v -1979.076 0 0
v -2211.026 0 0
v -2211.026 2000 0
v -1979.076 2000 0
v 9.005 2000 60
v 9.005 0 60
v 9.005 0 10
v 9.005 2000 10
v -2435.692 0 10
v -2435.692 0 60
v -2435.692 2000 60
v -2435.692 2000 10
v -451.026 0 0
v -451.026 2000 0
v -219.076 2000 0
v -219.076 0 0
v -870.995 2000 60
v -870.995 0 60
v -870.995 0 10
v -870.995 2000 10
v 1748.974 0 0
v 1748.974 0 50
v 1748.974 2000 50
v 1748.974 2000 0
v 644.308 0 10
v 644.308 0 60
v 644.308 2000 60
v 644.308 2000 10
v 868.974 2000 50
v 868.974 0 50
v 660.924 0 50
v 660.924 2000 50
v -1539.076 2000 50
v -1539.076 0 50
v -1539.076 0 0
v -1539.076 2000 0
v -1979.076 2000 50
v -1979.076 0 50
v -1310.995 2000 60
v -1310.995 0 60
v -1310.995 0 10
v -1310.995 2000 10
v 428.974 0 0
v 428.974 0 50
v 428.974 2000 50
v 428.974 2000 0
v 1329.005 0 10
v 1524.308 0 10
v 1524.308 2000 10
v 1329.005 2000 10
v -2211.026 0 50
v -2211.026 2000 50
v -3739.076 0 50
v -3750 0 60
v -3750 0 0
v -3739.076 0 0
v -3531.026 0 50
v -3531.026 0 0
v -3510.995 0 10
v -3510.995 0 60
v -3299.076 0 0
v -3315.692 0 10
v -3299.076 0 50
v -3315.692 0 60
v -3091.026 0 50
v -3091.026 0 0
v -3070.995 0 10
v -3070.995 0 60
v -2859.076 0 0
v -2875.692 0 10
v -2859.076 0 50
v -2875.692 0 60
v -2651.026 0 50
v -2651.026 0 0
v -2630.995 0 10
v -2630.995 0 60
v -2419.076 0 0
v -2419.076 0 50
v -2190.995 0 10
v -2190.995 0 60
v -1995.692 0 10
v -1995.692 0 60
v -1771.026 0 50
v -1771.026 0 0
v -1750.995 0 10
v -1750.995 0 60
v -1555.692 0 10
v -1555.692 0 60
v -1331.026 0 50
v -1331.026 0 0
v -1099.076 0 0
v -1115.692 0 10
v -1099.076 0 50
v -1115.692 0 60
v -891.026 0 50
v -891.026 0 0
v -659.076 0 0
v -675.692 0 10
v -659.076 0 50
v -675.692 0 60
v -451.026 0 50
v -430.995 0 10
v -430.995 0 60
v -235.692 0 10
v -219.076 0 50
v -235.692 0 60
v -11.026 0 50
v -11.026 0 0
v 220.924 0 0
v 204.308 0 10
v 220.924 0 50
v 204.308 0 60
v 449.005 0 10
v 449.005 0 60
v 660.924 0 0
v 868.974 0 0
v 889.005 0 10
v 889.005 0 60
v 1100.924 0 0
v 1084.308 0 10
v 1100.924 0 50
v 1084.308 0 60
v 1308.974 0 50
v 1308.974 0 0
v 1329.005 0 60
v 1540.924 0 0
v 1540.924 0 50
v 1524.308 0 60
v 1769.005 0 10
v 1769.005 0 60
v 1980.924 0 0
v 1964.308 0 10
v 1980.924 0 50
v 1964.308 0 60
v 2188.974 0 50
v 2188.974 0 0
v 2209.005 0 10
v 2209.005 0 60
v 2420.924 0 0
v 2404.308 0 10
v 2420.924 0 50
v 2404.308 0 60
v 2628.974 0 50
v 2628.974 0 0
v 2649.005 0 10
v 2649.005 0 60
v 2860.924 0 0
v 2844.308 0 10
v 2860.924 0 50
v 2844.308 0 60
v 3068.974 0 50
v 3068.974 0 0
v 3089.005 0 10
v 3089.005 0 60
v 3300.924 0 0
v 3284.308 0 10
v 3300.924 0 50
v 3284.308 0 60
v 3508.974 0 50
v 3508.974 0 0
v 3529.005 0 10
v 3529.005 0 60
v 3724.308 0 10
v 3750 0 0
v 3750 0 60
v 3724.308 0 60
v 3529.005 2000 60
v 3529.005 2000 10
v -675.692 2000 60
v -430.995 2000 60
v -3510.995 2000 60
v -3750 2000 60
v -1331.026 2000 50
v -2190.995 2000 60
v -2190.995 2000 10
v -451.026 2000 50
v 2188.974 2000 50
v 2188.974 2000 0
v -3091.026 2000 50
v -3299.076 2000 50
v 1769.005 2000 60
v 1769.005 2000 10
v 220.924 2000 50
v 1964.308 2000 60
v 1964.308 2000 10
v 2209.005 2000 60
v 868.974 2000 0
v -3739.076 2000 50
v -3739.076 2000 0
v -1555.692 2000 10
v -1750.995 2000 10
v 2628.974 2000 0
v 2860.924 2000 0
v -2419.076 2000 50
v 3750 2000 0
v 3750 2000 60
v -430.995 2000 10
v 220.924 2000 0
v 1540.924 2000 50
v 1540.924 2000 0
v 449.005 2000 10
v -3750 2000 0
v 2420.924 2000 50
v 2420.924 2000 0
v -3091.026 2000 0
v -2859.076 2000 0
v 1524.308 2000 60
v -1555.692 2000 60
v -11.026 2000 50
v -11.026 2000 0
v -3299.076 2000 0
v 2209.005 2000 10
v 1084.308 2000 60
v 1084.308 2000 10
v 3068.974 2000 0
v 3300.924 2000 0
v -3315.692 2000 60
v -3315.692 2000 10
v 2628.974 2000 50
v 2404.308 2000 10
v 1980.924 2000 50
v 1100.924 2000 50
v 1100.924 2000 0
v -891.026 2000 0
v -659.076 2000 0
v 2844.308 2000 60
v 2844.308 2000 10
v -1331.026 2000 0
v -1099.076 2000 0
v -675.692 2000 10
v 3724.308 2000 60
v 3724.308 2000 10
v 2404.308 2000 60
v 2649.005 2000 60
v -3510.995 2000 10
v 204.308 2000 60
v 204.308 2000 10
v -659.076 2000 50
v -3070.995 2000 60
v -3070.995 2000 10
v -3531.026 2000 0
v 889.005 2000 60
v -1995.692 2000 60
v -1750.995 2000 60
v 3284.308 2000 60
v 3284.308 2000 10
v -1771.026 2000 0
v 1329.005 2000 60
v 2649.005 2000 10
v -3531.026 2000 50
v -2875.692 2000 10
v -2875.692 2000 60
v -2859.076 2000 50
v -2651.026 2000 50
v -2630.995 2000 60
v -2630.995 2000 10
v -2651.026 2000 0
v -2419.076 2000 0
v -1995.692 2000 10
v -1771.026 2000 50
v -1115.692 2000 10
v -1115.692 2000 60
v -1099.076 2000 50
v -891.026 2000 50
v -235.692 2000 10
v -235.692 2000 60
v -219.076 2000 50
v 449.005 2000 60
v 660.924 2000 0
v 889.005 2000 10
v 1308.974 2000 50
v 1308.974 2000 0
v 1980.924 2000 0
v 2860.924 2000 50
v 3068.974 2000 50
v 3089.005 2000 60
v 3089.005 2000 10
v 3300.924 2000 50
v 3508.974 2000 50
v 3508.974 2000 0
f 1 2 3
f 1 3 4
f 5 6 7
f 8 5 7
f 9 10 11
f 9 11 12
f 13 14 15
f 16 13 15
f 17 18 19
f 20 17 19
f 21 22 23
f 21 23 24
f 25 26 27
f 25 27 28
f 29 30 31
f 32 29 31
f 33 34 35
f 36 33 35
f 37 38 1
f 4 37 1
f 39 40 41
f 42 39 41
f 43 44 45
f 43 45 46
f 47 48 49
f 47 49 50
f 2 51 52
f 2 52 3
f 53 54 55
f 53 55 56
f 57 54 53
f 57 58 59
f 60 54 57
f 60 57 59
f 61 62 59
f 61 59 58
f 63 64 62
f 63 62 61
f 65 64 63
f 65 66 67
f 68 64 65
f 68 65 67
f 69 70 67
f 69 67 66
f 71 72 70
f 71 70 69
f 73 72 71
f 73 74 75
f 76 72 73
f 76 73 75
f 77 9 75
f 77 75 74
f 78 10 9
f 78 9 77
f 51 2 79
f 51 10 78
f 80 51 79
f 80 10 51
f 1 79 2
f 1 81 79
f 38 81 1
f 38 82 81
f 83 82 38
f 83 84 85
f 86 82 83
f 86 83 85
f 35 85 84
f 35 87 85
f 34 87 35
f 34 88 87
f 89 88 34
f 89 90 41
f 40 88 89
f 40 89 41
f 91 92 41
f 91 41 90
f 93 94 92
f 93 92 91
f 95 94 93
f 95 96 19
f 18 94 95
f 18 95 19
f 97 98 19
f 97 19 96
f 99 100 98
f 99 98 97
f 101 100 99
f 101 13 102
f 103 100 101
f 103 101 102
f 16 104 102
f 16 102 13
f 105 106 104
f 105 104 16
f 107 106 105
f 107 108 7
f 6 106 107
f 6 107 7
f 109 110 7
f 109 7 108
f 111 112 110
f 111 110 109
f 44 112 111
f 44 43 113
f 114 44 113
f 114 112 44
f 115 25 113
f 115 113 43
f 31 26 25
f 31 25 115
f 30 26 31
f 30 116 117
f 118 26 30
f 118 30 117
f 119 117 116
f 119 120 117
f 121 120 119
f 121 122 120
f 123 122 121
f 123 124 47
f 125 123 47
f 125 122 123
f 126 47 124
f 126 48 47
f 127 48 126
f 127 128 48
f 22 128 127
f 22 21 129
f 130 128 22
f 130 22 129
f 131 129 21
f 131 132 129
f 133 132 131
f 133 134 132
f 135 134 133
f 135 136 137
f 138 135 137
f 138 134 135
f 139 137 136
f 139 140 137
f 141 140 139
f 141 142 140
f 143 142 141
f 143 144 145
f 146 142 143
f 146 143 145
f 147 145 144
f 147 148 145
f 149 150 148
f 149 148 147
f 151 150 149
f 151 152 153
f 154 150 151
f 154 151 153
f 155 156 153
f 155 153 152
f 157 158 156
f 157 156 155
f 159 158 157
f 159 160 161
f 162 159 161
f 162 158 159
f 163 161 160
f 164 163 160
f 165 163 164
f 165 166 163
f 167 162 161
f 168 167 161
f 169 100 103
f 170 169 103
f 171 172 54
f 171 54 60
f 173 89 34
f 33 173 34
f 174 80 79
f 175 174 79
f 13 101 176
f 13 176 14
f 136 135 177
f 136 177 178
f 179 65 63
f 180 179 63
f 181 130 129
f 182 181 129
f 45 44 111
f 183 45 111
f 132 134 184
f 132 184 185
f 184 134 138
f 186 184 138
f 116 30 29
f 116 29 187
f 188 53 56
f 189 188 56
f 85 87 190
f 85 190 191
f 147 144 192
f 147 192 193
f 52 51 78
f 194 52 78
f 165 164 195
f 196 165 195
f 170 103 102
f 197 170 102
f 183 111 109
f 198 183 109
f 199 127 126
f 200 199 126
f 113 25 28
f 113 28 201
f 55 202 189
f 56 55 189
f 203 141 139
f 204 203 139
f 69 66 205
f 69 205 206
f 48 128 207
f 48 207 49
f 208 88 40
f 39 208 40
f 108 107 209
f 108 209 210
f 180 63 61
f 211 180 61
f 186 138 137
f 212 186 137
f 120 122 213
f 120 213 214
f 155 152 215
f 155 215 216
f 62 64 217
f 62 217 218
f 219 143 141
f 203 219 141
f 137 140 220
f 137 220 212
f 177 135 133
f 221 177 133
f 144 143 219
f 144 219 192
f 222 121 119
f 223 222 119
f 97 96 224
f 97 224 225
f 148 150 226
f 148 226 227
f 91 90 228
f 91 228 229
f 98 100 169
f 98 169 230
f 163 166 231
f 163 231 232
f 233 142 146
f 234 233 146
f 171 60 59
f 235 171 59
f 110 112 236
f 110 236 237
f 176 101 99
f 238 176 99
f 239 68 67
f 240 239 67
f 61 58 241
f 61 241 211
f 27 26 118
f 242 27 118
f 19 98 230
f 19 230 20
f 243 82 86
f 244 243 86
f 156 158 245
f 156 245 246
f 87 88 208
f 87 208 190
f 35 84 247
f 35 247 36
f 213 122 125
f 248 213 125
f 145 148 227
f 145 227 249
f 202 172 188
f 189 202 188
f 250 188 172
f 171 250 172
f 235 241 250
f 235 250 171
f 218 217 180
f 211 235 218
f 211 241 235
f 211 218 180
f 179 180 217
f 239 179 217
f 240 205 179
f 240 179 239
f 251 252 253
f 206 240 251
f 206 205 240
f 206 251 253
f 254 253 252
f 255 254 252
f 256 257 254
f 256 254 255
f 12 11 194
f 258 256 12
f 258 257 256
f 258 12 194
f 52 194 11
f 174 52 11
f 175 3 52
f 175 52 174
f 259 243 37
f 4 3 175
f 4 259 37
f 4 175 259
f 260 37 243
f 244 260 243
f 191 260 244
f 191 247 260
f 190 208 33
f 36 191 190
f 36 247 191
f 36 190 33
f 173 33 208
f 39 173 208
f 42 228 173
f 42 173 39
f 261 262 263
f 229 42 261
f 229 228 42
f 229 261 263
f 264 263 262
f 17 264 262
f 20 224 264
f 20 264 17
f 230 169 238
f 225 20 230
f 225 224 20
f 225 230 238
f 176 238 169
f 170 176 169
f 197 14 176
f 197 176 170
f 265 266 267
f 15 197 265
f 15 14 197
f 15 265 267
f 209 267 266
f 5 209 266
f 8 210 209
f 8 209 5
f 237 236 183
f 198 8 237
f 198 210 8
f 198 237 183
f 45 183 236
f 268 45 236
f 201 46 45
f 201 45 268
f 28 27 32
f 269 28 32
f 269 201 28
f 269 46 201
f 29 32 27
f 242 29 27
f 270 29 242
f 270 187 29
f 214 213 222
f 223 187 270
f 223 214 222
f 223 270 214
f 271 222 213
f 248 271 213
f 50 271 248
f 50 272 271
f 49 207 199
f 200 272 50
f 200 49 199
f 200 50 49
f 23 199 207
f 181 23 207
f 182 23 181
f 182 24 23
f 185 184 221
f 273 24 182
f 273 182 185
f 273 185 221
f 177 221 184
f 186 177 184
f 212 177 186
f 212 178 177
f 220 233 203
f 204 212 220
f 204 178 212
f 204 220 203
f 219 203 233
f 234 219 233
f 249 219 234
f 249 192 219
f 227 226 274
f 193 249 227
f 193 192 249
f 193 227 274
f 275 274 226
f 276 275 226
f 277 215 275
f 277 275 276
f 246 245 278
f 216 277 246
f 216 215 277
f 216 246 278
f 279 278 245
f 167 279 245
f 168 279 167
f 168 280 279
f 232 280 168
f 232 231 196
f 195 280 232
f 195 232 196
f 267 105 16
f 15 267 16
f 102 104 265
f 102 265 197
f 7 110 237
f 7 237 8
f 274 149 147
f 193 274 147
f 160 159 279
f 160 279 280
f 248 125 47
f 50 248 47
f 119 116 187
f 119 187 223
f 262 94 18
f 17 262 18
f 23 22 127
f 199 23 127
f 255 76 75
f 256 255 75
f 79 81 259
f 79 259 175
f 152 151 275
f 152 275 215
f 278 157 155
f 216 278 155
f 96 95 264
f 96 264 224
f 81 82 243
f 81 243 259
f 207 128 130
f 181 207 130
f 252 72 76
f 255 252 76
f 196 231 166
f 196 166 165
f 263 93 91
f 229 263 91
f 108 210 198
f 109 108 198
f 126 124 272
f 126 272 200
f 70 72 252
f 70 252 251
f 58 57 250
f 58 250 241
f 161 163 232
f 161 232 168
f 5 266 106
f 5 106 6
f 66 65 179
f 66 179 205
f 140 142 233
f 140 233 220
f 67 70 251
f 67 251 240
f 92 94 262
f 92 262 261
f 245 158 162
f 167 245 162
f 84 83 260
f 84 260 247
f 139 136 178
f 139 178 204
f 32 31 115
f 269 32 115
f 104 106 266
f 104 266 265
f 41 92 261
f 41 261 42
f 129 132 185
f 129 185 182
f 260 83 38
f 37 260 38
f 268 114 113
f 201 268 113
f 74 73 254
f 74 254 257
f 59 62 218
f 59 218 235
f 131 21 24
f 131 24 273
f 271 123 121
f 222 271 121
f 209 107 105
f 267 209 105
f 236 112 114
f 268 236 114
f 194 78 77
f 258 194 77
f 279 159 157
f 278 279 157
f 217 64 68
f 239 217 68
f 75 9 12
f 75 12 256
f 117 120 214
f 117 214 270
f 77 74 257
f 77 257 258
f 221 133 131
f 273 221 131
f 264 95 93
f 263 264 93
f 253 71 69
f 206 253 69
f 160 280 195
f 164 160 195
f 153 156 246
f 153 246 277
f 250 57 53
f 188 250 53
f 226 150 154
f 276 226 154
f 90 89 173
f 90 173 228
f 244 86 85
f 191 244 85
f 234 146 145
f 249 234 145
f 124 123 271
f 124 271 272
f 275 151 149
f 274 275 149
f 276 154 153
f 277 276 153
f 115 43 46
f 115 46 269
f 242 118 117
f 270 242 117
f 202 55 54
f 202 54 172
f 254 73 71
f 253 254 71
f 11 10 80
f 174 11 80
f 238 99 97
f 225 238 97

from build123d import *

# Parameters (mm, degrees)
SKETCH1_W           = 7500
SKETCH1_H           = 4000
BOSS_EXTRUDE1_DEPTH = 60
SKETCH2_W           = 208.04993412
SKETCH2_H           = 50
SKETCH2_W_2         = 195.302892205
CUT_EXTRUDE1_DEPTH  = 5107
SKETCH3_W           = 8856.494382811
SKETCH3_H           = 2648.009884852
CUT_EXTRUDE2_DEPTH  = 887


with BuildPart() as part:
    # Sketch1 → Boss-Extrude1 (new body)
    with BuildSketch(Plane.XY):
        Rectangle(SKETCH1_W, SKETCH1_H)
    extrude(amount=BOSS_EXTRUDE1_DEPTH)

    # Sketch2 → Cut-Extrude1 (cut)
    with BuildSketch(Plane(origin=(0, -2000, 0), x_dir=(-1, 0, 0), z_dir=(0, -1, 0))):
        with Locations((3635.051095731, -25)):
            Rectangle(SKETCH2_W, SKETCH2_H)
        with Locations((3413.343616701, -35)):
            Rectangle(SKETCH2_W_2, SKETCH2_H)
        with Locations((3195.051095731, -25)):
            Rectangle(SKETCH2_W, SKETCH2_H)
        with Locations((2973.343616701, -35)):
            Rectangle(SKETCH2_W_2, SKETCH2_H)
        with Locations((2755.051095731, -25)):
            Rectangle(SKETCH2_W, SKETCH2_H)
        with Locations((2533.343616701, -35)):
            Rectangle(SKETCH2_W_2, SKETCH2_H)
        with Locations((2315.051095731, -25)):
            Rectangle(SKETCH2_W, SKETCH2_H)
        with Locations((2093.343616701, -35)):
            Rectangle(SKETCH2_W_2, SKETCH2_H)
        with Locations((1875.051095731, -25)):
            Rectangle(SKETCH2_W, SKETCH2_H)
        with Locations((1653.343616701, -35)):
            Rectangle(SKETCH2_W_2, SKETCH2_H)
        with Locations((1435.051095731, -25)):
            Rectangle(SKETCH2_W, SKETCH2_H)
        with Locations((1213.343616701, -35)):
            Rectangle(SKETCH2_W_2, SKETCH2_H)
        with Locations((995.051095731, -25)):
            Rectangle(SKETCH2_W, SKETCH2_H)
        with Locations((773.343616701, -35)):
            Rectangle(SKETCH2_W_2, SKETCH2_H)
        with Locations((555.051095731, -25)):
            Rectangle(SKETCH2_W, SKETCH2_H)
        with Locations((333.343616701, -35)):
            Rectangle(SKETCH2_W_2, SKETCH2_H)
        with Locations((115.051095731, -25)):
            Rectangle(SKETCH2_W, SKETCH2_H)
        with Locations((-106.6563833, -35)):
            Rectangle(SKETCH2_W_2, SKETCH2_H)
        with Locations((-324.948904269, -25)):
            Rectangle(SKETCH2_W, SKETCH2_H)
        with Locations((-546.6563833, -35)):
            Rectangle(SKETCH2_W_2, SKETCH2_H)
        with Locations((-764.948904269, -25)):
            Rectangle(SKETCH2_W, SKETCH2_H)
        with Locations((-986.6563833, -35)):
            Rectangle(SKETCH2_W_2, SKETCH2_H)
        with Locations((-1204.948904269, -25)):
            Rectangle(SKETCH2_W, SKETCH2_H)
        with Locations((-1426.6563833, -35)):
            Rectangle(SKETCH2_W_2, SKETCH2_H)
        with Locations((-1644.948904269, -25)):
            Rectangle(SKETCH2_W, SKETCH2_H)
        with Locations((-1866.6563833, -35)):
            Rectangle(SKETCH2_W_2, SKETCH2_H)
        with Locations((-2084.948904269, -25)):
            Rectangle(SKETCH2_W, SKETCH2_H)
        with Locations((-2306.6563833, -35)):
            Rectangle(SKETCH2_W_2, SKETCH2_H)
        with Locations((-2524.948904269, -25)):
            Rectangle(SKETCH2_W, SKETCH2_H)
        with Locations((-2746.6563833, -35)):
            Rectangle(SKETCH2_W_2, SKETCH2_H)
        with Locations((-2964.948904269, -25)):
            Rectangle(SKETCH2_W, SKETCH2_H)
        with Locations((-3186.6563833, -35)):
            Rectangle(SKETCH2_W_2, SKETCH2_H)
        with Locations((-3404.948904269, -25)):
            Rectangle(SKETCH2_W, SKETCH2_H)
        with Locations((-3626.6563833, -35)):
            Rectangle(SKETCH2_W_2, SKETCH2_H)
    extrude(amount=-CUT_EXTRUDE1_DEPTH, mode=Mode.SUBTRACT)

    # Sketch3 → Cut-Extrude2 (cut)
    with BuildSketch(Plane.XY.offset(60)):
        with Locations((480.44061202, -1324.004942426)):
            Rectangle(SKETCH3_W, SKETCH3_H)
    extrude(amount=-CUT_EXTRUDE2_DEPTH, mode=Mode.SUBTRACT)


solid = part.part
